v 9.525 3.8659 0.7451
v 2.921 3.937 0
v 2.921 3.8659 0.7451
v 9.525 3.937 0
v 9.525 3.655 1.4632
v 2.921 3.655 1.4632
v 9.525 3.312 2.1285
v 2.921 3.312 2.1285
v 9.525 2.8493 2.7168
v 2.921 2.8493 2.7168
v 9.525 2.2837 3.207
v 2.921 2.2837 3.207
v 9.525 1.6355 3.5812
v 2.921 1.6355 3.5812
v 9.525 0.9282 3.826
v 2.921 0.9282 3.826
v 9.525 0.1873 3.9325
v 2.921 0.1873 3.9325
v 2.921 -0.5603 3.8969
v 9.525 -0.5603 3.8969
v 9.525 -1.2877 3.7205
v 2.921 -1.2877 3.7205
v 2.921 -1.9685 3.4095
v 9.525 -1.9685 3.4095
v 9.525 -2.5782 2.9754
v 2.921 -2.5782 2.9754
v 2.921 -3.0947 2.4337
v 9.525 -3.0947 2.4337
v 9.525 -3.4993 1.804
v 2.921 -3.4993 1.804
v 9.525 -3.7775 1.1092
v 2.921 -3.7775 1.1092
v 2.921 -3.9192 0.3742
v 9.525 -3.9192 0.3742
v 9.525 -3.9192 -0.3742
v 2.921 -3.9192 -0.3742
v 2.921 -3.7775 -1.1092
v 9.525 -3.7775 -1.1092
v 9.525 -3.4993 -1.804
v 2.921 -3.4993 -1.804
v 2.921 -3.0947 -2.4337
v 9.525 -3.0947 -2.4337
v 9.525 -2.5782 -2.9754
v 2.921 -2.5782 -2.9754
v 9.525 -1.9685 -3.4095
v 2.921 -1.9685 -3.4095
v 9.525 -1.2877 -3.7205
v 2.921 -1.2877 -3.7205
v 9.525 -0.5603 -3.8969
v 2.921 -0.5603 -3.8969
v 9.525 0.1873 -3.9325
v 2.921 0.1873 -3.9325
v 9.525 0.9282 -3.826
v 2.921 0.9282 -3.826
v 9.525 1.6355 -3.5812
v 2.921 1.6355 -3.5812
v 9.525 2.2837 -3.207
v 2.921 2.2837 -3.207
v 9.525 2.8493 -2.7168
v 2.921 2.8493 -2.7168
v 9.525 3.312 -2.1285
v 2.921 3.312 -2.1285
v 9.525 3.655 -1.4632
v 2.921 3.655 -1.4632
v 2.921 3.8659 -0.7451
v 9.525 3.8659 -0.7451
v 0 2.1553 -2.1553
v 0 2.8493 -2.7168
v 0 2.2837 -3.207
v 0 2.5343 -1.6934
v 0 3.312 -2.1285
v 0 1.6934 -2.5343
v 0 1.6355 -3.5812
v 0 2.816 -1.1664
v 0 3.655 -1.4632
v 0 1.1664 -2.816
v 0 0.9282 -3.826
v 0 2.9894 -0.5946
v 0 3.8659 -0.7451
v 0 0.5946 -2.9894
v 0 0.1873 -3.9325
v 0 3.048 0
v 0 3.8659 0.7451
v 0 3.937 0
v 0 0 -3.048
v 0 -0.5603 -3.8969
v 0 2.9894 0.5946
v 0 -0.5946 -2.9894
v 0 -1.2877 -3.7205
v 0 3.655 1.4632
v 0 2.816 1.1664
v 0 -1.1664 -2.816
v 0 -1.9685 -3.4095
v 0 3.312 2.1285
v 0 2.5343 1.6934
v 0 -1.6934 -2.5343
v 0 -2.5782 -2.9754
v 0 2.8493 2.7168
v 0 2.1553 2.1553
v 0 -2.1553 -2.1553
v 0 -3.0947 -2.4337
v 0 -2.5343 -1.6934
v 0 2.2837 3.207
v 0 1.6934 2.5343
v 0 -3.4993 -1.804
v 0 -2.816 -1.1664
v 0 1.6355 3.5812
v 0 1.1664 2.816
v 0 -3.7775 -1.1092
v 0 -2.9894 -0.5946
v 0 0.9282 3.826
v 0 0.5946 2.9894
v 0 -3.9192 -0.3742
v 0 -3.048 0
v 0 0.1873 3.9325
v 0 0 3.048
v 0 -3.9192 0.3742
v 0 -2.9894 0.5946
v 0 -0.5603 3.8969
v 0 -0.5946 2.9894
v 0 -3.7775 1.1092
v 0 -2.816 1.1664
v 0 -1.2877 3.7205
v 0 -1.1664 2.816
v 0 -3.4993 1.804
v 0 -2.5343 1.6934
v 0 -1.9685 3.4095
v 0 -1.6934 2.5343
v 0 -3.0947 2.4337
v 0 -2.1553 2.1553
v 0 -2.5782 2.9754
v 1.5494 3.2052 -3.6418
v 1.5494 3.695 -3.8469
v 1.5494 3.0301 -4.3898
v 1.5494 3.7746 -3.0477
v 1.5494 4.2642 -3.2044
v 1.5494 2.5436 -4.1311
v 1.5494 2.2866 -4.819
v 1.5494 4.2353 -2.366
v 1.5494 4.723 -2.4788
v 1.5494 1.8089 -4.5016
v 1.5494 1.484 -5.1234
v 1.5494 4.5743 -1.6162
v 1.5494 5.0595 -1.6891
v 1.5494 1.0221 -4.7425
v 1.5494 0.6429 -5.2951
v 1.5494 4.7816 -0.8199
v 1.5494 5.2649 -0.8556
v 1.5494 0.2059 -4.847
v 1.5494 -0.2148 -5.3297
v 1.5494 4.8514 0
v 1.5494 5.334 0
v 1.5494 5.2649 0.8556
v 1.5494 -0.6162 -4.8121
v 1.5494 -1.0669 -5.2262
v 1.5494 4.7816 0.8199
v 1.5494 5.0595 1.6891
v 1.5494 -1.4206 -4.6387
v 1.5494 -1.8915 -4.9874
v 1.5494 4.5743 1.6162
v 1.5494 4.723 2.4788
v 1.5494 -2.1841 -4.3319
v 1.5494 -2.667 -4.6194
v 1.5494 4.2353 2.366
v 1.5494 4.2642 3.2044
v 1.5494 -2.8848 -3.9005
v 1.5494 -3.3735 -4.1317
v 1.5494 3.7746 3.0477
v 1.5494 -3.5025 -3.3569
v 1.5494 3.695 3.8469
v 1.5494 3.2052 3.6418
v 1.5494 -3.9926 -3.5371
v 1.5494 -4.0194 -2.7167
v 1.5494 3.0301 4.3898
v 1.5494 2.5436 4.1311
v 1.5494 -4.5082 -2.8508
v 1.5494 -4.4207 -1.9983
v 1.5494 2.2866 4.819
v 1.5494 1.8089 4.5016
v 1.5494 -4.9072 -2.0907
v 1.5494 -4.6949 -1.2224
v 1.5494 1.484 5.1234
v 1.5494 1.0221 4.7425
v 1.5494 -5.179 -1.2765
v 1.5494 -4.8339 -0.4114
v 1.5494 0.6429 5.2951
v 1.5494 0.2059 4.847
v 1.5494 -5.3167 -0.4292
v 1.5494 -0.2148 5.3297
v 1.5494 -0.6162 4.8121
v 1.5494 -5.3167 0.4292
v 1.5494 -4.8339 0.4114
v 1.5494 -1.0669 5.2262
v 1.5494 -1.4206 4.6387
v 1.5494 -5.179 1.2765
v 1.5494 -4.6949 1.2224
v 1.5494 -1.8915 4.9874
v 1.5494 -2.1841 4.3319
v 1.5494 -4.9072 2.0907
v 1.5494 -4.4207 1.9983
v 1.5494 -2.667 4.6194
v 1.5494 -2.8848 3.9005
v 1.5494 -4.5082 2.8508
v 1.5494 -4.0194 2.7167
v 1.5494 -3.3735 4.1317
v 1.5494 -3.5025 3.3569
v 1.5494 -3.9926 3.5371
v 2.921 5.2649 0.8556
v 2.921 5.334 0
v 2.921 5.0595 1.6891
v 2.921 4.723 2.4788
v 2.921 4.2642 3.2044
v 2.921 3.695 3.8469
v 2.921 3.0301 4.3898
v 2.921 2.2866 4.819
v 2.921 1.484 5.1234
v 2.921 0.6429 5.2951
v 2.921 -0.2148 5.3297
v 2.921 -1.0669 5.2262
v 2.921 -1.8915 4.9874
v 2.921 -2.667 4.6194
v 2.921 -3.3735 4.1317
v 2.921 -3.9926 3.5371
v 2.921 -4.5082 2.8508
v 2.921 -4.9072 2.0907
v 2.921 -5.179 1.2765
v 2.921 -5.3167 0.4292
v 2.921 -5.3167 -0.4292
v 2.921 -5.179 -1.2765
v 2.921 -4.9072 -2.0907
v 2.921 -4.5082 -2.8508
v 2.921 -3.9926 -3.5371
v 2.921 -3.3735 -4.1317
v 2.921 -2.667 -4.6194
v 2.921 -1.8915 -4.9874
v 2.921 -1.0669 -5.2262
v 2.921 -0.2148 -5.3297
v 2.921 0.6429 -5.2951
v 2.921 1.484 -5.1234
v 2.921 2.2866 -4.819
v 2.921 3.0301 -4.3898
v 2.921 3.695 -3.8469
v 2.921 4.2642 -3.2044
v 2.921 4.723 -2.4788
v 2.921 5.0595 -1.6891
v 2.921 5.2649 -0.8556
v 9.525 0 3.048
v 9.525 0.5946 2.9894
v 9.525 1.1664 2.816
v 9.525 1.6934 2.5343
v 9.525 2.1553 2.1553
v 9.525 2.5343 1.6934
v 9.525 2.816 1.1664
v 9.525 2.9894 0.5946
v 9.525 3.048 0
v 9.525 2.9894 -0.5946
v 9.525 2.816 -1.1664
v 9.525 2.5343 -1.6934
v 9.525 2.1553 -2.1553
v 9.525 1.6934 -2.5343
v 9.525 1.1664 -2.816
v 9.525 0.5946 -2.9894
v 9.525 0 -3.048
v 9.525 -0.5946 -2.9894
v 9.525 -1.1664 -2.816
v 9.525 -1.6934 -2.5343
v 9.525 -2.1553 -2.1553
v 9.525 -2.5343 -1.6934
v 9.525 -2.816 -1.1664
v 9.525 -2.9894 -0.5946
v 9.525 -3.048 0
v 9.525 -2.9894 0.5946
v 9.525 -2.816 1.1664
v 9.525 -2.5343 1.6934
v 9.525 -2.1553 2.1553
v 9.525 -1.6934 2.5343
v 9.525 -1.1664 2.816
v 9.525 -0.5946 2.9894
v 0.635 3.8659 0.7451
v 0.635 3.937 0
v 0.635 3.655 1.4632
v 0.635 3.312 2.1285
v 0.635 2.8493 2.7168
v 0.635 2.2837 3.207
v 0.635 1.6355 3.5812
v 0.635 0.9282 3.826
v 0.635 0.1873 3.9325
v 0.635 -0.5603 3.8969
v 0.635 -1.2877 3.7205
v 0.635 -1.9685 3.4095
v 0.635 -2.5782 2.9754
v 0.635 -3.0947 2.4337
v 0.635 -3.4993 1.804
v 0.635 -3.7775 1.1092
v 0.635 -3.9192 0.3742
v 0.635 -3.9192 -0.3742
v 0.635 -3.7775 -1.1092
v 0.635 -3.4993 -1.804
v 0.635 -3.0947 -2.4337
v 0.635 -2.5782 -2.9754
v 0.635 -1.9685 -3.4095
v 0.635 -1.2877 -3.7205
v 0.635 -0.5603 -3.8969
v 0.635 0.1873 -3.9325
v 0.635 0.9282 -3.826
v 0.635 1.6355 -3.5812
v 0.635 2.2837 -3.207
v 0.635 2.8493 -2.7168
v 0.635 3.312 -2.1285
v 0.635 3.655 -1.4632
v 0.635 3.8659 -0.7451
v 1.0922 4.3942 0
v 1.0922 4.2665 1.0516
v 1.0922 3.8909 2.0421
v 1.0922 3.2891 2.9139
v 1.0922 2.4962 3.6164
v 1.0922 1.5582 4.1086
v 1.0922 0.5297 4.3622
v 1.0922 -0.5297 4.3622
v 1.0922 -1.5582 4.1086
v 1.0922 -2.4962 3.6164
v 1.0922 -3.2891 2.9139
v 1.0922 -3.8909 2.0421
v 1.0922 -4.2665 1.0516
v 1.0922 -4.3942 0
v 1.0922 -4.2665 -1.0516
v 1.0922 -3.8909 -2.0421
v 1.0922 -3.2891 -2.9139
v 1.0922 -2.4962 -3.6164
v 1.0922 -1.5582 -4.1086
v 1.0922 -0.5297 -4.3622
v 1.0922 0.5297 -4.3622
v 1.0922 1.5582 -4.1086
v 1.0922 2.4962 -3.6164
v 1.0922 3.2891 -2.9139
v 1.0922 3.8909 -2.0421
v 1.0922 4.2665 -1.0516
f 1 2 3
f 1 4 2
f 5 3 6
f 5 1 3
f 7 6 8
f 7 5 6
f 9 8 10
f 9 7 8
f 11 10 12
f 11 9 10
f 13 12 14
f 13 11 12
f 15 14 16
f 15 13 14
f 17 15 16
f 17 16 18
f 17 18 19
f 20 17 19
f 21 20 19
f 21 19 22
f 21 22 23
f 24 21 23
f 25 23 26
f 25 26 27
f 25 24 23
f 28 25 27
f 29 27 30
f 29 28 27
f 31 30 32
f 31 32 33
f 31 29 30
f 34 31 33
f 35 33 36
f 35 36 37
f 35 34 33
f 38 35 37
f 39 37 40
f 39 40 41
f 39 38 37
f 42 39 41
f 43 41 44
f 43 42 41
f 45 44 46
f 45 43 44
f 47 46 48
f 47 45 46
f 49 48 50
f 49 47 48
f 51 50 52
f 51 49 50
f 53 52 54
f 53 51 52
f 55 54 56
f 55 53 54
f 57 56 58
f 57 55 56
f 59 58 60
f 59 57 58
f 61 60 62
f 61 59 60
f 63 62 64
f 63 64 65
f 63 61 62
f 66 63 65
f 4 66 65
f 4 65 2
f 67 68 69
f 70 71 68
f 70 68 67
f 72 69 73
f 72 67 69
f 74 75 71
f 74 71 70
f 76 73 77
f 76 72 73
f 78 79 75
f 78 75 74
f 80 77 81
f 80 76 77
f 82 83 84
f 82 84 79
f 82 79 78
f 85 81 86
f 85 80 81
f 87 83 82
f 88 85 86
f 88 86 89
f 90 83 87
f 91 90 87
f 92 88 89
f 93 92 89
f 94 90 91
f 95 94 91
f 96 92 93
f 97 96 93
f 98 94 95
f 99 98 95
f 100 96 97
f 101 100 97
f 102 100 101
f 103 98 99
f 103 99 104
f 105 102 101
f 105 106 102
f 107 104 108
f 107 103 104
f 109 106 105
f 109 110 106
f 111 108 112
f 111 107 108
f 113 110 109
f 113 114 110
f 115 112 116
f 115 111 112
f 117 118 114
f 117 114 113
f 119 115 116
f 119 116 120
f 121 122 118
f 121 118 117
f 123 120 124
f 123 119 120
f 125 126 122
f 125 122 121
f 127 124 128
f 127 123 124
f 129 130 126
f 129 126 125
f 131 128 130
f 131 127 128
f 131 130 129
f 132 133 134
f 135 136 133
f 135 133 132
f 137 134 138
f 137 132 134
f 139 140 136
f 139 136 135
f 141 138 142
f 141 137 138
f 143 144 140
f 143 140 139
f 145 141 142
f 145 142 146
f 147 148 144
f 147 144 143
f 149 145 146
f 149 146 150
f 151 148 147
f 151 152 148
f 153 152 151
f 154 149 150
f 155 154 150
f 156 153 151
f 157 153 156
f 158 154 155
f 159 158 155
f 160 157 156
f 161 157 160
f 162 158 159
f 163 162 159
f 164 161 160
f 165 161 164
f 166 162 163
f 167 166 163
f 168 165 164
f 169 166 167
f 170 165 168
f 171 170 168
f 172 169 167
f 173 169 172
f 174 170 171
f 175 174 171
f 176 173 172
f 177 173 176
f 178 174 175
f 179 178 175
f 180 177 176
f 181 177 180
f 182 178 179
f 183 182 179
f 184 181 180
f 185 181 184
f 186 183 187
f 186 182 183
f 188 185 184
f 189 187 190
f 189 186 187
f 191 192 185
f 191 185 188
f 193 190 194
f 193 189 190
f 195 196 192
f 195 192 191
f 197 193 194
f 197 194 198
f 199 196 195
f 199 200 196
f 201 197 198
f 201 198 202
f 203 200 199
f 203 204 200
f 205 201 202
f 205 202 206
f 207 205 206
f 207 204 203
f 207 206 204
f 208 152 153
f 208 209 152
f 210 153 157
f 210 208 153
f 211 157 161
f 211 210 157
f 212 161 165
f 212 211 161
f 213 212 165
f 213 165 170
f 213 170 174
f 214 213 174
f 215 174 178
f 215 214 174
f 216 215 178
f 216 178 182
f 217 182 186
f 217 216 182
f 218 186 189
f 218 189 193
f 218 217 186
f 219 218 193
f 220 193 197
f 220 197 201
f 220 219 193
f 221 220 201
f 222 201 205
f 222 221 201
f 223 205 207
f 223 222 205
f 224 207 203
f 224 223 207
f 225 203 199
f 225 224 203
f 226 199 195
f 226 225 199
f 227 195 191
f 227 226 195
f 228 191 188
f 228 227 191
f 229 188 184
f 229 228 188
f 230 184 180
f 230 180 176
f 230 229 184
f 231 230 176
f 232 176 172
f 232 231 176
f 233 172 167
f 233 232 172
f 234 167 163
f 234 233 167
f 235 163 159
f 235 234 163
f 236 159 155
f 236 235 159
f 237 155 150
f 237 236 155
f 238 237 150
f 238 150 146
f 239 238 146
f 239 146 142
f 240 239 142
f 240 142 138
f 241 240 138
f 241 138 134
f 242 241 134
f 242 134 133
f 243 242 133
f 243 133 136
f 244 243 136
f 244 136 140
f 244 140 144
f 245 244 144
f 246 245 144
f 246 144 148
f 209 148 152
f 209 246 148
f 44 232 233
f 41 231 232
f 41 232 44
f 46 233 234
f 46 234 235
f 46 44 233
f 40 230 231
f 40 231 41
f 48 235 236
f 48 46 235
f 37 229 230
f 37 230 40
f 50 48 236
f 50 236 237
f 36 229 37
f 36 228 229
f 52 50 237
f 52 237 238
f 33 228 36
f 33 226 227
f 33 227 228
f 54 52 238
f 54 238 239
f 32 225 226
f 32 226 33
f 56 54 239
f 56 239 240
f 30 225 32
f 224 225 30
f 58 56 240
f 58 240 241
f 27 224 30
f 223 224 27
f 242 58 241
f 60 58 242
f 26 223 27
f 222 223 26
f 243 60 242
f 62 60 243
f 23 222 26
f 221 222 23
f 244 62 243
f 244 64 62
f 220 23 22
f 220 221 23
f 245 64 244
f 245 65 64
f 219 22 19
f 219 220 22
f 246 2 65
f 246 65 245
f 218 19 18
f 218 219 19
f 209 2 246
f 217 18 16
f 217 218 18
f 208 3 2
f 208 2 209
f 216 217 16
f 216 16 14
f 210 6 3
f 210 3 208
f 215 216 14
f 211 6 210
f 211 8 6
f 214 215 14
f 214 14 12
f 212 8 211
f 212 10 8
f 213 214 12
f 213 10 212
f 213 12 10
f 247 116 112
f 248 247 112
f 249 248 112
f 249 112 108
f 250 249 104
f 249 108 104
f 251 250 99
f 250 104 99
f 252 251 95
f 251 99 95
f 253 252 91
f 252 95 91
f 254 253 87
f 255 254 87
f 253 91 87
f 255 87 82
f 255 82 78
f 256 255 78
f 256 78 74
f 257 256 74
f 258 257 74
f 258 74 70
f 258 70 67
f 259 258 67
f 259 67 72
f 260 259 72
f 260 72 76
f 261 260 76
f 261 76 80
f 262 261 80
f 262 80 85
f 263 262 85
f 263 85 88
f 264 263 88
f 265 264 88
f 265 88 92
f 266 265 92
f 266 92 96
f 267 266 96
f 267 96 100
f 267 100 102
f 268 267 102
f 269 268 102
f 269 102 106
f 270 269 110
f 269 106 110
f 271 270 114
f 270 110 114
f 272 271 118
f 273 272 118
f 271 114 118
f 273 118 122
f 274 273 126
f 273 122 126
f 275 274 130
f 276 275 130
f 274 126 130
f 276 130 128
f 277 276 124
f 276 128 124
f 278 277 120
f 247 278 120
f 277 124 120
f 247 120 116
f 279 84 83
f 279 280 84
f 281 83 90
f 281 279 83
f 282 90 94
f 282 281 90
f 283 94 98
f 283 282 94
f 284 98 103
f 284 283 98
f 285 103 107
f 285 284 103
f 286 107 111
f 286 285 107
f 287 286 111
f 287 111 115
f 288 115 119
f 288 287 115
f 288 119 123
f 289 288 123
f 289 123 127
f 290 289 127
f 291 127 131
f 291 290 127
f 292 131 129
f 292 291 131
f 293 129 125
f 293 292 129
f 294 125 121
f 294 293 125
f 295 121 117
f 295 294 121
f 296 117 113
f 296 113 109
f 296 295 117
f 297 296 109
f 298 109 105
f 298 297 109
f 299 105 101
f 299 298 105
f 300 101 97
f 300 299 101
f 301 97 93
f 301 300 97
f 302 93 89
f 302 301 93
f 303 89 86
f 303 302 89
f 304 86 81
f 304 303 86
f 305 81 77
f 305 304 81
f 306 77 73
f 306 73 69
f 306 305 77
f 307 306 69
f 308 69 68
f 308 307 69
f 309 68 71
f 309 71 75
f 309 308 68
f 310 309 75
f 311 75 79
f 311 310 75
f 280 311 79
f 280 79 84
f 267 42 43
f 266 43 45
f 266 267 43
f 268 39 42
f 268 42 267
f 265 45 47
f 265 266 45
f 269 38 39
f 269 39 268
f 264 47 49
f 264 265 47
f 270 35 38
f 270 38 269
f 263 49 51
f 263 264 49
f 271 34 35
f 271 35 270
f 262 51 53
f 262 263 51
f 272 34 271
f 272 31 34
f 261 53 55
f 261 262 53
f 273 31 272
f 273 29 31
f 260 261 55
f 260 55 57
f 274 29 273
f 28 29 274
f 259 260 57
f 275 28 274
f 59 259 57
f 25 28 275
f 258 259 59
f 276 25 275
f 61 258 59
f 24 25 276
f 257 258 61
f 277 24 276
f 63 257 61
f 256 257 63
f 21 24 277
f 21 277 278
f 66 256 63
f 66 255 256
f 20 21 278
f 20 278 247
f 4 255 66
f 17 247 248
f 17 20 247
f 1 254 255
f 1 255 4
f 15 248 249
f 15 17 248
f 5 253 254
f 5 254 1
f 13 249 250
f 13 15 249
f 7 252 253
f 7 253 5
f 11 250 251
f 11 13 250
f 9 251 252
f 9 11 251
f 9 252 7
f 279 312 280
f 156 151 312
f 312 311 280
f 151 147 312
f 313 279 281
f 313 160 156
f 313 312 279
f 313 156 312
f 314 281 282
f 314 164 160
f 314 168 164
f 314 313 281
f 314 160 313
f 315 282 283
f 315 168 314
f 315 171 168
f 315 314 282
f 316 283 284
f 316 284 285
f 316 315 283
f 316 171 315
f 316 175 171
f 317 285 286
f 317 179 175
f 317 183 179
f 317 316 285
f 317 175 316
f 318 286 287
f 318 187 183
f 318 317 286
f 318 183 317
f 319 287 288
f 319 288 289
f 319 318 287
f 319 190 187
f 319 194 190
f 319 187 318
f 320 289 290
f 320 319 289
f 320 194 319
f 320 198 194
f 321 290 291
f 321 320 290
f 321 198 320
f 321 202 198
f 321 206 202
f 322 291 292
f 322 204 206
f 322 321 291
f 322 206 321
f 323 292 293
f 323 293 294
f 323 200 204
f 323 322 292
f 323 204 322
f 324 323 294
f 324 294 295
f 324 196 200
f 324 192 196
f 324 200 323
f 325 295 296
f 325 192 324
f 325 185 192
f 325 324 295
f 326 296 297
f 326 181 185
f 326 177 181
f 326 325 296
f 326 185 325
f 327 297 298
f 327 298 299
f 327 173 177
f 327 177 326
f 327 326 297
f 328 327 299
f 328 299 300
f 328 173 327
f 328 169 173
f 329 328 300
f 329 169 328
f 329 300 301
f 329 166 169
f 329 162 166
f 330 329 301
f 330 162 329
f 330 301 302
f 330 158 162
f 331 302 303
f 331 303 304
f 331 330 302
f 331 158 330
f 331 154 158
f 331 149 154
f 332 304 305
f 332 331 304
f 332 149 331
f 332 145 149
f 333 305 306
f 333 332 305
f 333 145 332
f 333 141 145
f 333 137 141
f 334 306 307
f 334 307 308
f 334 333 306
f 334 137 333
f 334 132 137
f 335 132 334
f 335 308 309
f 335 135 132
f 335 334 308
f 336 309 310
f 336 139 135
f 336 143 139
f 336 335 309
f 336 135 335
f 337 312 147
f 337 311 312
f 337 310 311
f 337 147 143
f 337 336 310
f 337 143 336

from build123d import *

# Parameters (mm, degrees)
F_1_4_0_24_DIAMETER_HOLE1_D = 6.096


with BuildPart() as part:
    # Sketch1 → Revolve1 (revolve)
    with BuildSketch(Plane.XY):
        Polygon((0, 0), (0, 3.937), (0.635, 3.937), (1.5494, 4.8514), (1.5494, 5.334), (2.921, 5.334), (2.921, 3.937), (9.525, 3.937), (9.525, 0), align=None)
    revolve(axis=Axis((-1.987928477, 0, 0), (1, 0, 0)))

    # 1/4 (0.24) Diameter Hole1 (through all)
    with Locations(Plane(origin=(9.525, 0, 0), x_dir=(0, 0, -1), z_dir=(1, 0, 0))):
        with Locations((0, 0)):
            Hole(F_1_4_0_24_DIAMETER_HOLE1_D / 2)


solid = part.part
